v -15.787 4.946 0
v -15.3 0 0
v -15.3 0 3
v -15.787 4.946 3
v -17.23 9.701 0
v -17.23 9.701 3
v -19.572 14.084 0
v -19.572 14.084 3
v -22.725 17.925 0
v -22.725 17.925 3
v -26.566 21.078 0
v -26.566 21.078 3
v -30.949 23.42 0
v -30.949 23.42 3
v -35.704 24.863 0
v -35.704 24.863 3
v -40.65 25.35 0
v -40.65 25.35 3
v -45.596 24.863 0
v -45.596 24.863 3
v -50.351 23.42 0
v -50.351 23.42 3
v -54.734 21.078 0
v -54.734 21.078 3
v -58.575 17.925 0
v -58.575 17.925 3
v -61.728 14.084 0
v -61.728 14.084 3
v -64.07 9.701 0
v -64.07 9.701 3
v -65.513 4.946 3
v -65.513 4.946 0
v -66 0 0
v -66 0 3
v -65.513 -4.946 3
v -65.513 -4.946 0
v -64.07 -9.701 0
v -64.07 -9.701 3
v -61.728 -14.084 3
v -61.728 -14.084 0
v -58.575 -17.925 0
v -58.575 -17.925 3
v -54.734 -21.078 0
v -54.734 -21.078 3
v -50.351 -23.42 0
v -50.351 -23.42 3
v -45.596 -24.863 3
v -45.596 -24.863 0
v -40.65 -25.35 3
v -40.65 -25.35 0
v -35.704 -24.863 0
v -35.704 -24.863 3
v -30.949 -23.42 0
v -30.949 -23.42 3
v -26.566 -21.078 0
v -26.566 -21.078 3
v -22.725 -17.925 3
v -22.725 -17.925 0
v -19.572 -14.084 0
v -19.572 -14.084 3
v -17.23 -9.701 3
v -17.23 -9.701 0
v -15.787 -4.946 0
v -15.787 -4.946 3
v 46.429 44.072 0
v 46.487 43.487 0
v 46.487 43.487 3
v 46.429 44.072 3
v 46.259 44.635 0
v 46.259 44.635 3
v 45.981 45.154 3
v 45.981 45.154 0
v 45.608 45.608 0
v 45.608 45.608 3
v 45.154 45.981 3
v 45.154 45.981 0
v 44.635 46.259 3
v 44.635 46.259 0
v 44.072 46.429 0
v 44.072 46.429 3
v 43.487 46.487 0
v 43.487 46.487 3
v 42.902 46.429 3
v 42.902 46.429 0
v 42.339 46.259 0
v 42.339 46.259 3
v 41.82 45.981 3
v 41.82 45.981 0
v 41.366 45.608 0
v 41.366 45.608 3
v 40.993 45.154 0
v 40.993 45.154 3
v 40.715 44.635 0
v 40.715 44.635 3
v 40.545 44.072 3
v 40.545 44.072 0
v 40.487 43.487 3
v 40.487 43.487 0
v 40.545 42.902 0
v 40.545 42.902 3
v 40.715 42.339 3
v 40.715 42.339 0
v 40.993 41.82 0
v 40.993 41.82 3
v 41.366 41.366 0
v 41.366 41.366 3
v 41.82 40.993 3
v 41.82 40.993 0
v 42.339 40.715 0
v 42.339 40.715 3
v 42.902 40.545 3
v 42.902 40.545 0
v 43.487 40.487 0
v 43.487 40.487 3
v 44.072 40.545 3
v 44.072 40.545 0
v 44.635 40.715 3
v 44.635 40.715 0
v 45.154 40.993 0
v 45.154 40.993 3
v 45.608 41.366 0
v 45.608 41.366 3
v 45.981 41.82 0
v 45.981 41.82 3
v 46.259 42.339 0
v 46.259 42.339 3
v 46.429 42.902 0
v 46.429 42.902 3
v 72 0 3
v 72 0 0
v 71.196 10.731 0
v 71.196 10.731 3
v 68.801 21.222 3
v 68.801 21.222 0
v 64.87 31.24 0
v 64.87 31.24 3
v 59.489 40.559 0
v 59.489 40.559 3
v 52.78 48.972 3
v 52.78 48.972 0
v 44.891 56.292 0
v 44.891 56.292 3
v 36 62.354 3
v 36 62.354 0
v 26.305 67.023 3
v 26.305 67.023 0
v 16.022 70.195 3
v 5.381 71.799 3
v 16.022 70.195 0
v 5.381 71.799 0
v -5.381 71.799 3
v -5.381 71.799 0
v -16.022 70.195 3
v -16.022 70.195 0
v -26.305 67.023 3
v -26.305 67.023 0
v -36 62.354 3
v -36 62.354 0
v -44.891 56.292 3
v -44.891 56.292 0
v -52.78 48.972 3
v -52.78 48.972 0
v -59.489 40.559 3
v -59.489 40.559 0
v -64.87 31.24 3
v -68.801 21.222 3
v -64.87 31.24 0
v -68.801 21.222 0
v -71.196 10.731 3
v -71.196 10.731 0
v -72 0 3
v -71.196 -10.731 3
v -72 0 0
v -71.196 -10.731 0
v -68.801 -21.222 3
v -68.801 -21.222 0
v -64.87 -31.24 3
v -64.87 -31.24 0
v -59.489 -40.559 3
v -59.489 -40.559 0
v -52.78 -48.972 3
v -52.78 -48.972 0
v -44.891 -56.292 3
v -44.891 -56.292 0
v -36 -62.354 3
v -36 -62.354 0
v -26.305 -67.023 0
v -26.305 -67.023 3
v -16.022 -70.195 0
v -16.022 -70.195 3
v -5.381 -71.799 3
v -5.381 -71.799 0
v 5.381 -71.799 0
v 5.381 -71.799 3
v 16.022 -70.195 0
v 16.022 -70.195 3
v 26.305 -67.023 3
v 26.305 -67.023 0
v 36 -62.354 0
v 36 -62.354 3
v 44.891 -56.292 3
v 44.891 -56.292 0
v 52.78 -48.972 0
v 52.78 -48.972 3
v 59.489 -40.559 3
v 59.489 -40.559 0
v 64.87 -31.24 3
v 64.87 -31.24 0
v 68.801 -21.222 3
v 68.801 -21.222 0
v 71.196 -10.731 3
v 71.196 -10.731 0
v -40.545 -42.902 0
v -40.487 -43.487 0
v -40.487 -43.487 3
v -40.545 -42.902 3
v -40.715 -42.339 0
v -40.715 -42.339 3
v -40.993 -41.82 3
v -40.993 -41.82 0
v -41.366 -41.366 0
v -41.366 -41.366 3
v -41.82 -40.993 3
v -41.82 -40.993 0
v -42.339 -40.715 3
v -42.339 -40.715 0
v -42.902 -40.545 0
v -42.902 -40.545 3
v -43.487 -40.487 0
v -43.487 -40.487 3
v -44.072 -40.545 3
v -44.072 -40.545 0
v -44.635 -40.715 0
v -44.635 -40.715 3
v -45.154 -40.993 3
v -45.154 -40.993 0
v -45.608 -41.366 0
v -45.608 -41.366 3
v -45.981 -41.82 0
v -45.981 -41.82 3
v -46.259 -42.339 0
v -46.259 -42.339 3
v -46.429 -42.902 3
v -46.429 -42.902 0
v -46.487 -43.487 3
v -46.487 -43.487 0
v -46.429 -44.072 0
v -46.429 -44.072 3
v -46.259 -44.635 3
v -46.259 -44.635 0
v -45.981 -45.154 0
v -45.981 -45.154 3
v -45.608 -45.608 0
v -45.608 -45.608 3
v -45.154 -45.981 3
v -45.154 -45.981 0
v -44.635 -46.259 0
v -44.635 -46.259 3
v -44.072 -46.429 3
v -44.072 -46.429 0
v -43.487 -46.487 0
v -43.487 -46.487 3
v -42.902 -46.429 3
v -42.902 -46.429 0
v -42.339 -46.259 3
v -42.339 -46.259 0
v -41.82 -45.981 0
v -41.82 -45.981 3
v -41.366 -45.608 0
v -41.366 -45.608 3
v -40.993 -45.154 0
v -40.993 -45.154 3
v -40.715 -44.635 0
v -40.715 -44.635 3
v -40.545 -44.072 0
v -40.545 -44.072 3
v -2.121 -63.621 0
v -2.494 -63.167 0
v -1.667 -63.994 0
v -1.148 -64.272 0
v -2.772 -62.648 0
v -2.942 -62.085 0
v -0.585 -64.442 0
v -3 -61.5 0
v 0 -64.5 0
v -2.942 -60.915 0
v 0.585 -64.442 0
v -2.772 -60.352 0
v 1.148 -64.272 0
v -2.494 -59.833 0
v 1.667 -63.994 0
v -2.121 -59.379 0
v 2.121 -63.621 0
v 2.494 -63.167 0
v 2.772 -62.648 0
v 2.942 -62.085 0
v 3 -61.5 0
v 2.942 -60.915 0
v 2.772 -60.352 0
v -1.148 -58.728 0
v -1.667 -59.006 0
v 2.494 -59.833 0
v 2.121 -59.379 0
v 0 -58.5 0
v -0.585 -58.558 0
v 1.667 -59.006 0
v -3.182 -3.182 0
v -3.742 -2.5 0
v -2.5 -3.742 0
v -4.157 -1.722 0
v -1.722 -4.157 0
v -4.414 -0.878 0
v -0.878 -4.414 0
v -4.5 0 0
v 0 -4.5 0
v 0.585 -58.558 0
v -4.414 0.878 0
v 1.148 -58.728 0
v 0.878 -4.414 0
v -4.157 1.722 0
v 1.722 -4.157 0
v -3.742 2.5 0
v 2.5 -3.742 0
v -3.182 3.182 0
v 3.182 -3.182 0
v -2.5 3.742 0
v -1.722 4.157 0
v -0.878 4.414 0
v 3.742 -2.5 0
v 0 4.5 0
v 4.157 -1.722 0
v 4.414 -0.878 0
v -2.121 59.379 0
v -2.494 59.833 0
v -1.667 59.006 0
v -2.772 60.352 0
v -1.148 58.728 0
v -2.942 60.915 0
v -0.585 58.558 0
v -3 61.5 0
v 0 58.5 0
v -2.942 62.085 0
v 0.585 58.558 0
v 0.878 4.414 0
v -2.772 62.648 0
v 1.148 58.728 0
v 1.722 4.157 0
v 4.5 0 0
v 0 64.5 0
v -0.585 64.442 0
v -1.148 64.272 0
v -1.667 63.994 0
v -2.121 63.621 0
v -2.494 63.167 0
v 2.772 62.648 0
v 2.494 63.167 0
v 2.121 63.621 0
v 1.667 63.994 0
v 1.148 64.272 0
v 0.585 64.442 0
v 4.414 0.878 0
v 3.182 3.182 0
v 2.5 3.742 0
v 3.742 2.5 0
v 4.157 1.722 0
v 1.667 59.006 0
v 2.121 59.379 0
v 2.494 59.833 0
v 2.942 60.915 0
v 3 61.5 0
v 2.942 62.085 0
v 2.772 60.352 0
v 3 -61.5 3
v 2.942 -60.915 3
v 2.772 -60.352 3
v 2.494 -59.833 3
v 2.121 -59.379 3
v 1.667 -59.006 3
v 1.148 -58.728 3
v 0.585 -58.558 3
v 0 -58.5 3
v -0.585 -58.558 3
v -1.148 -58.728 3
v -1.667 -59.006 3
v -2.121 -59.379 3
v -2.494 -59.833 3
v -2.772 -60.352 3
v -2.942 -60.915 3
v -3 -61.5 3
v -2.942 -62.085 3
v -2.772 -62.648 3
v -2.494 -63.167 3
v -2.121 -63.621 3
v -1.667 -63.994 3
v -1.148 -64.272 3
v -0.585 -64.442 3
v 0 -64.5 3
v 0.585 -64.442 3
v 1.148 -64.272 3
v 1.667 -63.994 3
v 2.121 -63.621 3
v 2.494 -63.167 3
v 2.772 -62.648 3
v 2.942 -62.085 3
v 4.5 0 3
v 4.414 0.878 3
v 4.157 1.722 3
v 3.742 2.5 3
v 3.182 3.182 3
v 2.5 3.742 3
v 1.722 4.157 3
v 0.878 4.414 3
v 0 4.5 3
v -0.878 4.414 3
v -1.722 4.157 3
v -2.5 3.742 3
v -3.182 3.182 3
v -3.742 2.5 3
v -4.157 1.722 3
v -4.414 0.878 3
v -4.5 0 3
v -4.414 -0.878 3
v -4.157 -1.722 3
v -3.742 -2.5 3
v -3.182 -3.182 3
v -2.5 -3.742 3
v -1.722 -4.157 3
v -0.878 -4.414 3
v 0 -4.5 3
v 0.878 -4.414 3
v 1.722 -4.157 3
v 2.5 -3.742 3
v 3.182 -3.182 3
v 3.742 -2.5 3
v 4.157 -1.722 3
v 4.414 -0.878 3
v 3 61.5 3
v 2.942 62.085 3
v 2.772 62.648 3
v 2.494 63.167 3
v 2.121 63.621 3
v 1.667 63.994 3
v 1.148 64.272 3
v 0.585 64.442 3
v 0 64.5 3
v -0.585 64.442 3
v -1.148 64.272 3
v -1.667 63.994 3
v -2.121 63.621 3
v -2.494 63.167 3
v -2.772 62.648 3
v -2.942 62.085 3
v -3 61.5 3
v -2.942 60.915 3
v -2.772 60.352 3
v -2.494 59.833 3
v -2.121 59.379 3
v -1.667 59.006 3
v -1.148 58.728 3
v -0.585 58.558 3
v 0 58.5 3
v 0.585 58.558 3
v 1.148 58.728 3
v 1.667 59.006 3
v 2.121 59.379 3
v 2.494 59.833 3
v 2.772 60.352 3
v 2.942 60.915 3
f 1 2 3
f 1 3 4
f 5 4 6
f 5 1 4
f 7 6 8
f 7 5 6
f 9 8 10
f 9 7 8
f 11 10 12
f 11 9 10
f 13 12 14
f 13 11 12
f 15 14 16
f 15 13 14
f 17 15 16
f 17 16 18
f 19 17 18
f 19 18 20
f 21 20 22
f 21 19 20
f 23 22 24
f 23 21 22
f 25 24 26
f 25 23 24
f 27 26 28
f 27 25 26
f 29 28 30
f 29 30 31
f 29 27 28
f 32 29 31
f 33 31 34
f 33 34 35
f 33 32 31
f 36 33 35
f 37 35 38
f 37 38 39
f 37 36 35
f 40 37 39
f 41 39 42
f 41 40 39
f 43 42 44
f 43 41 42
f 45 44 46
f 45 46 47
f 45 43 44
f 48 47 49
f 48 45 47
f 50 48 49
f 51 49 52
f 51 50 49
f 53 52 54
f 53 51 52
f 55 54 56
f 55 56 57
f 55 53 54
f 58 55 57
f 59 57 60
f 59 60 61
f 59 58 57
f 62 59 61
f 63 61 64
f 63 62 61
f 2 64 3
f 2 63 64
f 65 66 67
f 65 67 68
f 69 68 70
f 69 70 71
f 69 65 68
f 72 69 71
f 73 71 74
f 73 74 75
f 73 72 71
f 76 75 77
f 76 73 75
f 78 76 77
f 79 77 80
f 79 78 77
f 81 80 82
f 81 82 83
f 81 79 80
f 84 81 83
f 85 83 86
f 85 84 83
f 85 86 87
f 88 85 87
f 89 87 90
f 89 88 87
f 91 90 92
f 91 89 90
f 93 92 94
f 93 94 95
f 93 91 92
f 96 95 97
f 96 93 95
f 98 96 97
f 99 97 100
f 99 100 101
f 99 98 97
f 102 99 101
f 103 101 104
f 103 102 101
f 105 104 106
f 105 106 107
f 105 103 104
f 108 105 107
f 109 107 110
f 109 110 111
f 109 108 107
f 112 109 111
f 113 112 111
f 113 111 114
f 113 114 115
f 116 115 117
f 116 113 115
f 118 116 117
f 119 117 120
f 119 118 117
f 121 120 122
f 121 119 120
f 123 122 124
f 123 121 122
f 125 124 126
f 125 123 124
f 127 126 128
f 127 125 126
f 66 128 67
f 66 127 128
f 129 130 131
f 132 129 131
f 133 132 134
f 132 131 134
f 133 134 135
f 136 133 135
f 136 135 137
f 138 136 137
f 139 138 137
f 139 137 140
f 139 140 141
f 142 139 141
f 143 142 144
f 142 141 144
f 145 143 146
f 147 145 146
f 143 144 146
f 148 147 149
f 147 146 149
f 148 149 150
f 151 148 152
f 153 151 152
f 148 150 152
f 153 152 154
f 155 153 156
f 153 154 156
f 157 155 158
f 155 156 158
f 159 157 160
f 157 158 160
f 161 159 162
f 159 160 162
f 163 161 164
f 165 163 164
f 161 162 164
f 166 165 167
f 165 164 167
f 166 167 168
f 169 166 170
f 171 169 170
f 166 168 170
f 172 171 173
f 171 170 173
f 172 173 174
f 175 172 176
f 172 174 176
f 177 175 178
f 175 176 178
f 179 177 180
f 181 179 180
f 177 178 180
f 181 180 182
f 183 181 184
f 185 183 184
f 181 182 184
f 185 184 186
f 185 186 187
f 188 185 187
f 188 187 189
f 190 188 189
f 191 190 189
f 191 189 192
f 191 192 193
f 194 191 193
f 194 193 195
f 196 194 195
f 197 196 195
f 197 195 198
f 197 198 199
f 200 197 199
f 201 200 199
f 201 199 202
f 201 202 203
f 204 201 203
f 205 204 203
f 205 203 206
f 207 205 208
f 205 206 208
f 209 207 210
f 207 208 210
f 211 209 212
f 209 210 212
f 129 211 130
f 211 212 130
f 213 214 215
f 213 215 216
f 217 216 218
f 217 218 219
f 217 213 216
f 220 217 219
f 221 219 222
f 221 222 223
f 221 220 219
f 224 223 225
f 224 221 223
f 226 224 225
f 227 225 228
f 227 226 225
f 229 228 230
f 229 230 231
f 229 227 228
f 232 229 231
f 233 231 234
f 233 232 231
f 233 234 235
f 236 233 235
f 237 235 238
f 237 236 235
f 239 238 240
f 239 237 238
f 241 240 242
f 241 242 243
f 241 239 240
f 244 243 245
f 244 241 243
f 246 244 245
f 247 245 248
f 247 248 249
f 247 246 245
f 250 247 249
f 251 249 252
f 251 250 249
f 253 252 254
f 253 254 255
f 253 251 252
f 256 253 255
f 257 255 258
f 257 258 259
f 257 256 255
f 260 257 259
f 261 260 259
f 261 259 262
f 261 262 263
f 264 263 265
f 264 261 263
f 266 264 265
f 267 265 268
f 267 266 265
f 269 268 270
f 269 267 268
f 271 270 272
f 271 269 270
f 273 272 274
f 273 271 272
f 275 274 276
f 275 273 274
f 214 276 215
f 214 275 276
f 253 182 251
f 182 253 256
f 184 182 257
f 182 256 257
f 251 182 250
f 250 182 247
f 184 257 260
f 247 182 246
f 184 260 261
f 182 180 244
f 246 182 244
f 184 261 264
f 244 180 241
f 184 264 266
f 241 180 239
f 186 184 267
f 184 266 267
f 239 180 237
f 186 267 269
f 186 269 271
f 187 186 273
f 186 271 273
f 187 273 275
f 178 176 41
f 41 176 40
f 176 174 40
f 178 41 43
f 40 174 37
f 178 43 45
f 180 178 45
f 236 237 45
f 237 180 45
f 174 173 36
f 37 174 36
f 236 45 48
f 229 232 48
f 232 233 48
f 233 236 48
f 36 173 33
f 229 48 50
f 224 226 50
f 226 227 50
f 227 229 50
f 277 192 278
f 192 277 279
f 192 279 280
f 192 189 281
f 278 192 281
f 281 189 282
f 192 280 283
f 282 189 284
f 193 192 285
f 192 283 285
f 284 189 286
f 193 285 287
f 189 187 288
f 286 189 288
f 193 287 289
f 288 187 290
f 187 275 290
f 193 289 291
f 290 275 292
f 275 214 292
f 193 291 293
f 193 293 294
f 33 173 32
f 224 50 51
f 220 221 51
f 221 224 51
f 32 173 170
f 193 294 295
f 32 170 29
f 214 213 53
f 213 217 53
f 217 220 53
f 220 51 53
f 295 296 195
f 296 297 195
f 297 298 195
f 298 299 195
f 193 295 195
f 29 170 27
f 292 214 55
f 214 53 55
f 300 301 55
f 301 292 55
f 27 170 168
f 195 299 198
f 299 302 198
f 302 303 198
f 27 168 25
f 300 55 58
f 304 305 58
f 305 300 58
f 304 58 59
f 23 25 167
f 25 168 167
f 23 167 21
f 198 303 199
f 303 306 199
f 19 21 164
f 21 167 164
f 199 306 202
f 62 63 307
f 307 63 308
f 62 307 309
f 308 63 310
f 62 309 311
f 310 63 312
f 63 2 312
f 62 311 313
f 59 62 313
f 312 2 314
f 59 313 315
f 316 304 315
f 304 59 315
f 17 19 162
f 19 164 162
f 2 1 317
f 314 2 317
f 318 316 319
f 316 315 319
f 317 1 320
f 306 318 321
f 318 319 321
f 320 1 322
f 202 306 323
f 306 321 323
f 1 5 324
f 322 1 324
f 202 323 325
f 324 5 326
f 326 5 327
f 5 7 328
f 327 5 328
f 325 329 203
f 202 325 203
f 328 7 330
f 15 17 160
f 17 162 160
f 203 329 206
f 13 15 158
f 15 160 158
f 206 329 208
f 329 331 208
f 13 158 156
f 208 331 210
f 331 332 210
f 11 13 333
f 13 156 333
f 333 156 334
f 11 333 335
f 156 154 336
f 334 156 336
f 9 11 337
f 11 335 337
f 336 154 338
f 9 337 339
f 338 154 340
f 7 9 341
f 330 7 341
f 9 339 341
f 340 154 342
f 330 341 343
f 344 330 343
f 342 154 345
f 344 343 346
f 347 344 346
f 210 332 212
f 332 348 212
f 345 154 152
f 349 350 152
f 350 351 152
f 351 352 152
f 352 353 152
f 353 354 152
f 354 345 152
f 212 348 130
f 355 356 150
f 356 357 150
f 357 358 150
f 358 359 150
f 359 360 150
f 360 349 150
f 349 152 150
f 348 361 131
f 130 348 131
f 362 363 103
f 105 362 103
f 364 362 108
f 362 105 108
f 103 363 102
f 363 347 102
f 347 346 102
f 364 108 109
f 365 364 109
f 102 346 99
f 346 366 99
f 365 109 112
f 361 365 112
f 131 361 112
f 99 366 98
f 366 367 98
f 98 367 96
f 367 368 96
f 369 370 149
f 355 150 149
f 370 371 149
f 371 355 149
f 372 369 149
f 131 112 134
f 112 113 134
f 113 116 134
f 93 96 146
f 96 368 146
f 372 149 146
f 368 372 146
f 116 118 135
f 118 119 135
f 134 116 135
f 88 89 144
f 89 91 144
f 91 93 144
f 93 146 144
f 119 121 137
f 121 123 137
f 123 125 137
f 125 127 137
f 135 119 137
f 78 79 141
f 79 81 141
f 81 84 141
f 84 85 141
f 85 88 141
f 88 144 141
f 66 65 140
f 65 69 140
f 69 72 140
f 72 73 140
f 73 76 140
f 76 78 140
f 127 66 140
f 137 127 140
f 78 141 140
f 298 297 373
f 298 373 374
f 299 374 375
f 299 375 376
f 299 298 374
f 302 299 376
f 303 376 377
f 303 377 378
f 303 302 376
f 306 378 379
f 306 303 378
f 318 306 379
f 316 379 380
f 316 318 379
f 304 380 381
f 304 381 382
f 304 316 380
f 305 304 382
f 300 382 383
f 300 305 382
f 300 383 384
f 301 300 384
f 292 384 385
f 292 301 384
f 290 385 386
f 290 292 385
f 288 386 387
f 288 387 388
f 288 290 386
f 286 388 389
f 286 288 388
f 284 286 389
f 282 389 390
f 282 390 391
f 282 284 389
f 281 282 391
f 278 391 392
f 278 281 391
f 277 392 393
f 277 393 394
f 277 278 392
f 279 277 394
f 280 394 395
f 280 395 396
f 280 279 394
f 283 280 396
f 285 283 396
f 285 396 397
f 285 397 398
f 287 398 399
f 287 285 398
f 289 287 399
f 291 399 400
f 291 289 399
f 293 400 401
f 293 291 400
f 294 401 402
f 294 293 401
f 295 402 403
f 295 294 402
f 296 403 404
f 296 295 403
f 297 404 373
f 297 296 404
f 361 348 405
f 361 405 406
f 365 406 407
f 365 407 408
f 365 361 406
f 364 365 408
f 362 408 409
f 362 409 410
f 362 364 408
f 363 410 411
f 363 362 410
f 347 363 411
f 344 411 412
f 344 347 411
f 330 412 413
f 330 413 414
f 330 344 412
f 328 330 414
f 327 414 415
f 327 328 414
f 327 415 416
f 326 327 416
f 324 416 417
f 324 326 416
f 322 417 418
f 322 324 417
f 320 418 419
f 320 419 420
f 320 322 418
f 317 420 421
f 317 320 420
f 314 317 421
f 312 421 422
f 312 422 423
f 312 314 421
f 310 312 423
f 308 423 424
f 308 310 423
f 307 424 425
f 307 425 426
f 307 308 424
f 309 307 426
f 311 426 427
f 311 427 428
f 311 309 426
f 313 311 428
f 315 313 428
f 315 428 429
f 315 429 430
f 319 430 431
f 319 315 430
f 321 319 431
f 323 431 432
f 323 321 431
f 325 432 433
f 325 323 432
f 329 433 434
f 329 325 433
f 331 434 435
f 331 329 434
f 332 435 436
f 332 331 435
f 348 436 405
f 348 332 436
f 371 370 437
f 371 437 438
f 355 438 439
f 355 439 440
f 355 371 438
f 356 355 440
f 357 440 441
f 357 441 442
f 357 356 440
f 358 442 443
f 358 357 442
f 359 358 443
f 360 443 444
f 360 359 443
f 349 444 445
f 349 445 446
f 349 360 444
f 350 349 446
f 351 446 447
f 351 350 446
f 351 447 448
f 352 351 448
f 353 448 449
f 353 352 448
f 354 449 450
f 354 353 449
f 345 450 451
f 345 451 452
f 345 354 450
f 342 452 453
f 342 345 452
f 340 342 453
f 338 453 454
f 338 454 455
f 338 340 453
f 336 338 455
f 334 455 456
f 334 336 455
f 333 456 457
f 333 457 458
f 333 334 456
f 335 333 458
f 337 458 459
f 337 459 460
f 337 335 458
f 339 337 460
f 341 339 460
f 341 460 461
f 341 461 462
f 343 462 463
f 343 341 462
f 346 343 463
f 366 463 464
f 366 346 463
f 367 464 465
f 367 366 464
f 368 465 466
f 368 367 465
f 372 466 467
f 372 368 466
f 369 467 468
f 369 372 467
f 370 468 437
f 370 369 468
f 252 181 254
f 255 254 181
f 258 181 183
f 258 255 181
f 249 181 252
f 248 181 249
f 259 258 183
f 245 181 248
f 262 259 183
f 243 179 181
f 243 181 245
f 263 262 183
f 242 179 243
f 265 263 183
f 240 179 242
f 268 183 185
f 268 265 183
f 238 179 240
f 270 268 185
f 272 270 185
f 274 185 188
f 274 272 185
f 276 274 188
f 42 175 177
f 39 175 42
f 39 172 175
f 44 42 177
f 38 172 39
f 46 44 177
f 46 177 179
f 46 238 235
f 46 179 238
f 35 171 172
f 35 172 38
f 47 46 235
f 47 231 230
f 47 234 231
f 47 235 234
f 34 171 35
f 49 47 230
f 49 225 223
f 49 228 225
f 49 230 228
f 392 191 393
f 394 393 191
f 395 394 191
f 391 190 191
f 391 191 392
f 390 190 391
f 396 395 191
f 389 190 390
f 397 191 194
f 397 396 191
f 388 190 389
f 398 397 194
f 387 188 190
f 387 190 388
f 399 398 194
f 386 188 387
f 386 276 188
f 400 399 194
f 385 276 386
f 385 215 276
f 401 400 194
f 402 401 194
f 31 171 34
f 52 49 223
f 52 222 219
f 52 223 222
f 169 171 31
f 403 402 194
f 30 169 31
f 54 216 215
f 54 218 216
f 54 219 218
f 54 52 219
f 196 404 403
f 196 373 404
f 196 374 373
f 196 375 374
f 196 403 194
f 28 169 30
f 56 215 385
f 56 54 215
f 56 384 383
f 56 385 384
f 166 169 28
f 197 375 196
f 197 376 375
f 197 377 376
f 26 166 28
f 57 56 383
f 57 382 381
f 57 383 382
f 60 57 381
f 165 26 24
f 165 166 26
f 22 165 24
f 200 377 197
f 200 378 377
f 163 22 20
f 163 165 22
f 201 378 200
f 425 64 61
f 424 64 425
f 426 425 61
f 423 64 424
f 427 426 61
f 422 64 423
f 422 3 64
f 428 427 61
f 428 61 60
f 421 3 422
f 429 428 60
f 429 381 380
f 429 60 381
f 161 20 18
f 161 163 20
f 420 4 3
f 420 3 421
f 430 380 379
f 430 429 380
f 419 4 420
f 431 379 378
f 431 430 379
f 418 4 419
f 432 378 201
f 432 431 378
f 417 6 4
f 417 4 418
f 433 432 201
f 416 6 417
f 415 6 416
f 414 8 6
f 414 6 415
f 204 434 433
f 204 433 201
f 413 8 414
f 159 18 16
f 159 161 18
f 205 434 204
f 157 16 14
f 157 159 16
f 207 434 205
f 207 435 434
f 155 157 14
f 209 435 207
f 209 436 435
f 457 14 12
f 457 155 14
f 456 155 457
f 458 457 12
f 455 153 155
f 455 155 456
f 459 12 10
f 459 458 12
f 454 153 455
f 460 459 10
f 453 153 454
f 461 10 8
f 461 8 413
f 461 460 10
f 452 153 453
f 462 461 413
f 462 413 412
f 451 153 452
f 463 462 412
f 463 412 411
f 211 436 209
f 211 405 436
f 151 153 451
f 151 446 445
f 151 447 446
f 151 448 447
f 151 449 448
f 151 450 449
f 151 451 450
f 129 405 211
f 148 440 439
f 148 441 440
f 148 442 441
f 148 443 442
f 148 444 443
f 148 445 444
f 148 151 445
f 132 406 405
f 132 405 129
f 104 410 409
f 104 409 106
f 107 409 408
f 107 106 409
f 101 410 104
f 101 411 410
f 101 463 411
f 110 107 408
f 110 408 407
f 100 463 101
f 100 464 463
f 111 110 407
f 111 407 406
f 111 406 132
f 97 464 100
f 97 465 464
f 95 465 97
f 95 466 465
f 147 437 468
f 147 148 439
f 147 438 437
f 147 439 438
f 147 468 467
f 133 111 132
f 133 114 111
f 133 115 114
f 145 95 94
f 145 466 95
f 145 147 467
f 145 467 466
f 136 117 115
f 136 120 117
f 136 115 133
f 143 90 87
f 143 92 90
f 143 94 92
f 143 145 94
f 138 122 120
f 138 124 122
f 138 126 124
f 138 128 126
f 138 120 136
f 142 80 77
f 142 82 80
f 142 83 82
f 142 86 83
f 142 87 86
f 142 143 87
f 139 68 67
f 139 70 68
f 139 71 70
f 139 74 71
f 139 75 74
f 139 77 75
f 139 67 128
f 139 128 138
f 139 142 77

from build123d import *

# Parameters (mm, degrees)
F0_R     = 72
F0_R_2   = 3
F0_R_3   = 25.35
F0_R_4   = 4.5
F1_DEPTH = 3


with BuildPart() as f1:
    # F0 (on Top) → F1 (new body)
    with BuildSketch(Plane.XY):
        Circle(F0_R)
        with Locations((-43.487067, -43.487067)):
            Circle(F0_R_2, mode=Mode.SUBTRACT)
        with Locations((0, -61.5)):
            Circle(F0_R_2, mode=Mode.SUBTRACT)
        with Locations((-40.65, 0)):
            Circle(F0_R_3, mode=Mode.SUBTRACT)
        Circle(F0_R_4, mode=Mode.SUBTRACT)
        with Locations((0, 61.5)):
            Circle(F0_R_2, mode=Mode.SUBTRACT)
        with Locations((43.487067, 43.487067)):
            Circle(F0_R_2, mode=Mode.SUBTRACT)
    extrude(amount=F1_DEPTH)


solid = f1.part
